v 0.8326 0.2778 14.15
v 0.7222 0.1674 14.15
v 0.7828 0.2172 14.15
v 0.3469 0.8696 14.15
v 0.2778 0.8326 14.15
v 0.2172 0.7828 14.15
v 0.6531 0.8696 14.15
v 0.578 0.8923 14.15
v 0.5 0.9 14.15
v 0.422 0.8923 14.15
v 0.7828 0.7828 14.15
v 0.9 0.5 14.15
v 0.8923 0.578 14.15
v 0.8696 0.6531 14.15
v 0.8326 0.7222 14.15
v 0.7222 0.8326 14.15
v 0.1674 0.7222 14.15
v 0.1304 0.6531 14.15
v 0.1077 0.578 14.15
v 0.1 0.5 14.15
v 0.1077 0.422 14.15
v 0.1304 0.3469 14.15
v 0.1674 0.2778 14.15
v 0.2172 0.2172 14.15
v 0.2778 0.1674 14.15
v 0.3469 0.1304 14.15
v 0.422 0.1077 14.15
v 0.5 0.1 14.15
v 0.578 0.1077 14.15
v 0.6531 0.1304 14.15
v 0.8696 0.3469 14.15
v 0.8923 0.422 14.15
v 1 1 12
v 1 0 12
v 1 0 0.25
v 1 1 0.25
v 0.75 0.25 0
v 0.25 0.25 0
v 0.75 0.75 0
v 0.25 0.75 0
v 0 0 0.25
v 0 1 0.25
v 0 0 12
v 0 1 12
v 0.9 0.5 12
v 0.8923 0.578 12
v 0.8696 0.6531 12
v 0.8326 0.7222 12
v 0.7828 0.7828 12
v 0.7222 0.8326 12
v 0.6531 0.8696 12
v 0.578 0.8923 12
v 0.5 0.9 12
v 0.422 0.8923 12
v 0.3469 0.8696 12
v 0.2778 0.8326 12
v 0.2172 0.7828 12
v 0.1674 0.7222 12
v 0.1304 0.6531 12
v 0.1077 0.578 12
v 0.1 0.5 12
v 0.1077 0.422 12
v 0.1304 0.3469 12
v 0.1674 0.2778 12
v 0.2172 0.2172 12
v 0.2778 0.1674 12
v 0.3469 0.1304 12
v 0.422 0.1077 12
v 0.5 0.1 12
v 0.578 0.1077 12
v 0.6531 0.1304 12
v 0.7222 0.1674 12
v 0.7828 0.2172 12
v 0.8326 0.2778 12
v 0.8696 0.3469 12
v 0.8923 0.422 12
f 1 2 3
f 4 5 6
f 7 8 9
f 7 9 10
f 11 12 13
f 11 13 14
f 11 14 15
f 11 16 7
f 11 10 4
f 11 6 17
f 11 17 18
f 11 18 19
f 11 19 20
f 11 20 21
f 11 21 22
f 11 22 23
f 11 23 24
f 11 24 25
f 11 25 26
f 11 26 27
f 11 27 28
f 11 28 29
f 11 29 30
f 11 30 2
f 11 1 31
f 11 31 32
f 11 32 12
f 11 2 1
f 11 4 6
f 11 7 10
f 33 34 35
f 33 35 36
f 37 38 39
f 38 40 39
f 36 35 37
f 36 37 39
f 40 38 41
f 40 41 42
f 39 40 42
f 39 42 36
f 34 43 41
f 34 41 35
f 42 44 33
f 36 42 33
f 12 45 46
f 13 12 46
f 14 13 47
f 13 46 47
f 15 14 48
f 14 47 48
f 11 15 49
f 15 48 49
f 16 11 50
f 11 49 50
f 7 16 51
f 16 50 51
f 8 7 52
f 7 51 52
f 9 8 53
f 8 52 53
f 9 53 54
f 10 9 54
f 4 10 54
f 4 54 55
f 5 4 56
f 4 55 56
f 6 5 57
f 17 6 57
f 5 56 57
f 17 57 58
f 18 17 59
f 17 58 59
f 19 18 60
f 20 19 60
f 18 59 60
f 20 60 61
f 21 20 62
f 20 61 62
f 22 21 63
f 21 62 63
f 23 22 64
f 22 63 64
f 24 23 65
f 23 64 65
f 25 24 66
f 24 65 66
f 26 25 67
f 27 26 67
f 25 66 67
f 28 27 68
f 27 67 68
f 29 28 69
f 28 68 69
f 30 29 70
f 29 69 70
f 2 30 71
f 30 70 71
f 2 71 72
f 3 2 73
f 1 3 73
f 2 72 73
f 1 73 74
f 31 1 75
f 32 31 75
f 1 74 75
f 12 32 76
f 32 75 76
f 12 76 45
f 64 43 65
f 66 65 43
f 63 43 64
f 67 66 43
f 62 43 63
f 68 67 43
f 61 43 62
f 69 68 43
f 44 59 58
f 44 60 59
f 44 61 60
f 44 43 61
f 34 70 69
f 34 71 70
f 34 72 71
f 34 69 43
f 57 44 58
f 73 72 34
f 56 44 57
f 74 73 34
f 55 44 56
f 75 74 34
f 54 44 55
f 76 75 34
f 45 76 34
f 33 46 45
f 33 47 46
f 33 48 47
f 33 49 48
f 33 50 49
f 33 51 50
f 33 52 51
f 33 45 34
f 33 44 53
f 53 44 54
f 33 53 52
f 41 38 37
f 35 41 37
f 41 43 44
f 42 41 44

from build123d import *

# Parameters (mm, degrees)
F0_W     = 1
F0_H     = 1
F1_DEPTH = 12
F2_R     = 0.4
F3_DEPTH = 2.15
F4_SIZE  = 0.25


with BuildPart() as f1:
    # F0 (on Top) → F1 (new body)
    with BuildSketch(Plane.XY):
        with Locations((0.5, 0.5)):
            Rectangle(F0_W, F0_H)
    extrude(amount=F1_DEPTH)

    # F2 (on face) → F3 (join)
    with BuildSketch(Plane.XY.offset(12)):
        with Locations((0.5, 0.5)):
            Circle(F2_R)
    extrude(amount=F3_DEPTH)

    # F4
    f4_edges = [f1.edges().sort_by_distance(p)[0] for p in [
        (0.5, 0, 0),
        (0, 0.5, 0),
        (1, 0.5, 0),
        (0.5, 1, 0),
    ]]
    chamfer(f4_edges, length=F4_SIZE)


solid = f1.part
